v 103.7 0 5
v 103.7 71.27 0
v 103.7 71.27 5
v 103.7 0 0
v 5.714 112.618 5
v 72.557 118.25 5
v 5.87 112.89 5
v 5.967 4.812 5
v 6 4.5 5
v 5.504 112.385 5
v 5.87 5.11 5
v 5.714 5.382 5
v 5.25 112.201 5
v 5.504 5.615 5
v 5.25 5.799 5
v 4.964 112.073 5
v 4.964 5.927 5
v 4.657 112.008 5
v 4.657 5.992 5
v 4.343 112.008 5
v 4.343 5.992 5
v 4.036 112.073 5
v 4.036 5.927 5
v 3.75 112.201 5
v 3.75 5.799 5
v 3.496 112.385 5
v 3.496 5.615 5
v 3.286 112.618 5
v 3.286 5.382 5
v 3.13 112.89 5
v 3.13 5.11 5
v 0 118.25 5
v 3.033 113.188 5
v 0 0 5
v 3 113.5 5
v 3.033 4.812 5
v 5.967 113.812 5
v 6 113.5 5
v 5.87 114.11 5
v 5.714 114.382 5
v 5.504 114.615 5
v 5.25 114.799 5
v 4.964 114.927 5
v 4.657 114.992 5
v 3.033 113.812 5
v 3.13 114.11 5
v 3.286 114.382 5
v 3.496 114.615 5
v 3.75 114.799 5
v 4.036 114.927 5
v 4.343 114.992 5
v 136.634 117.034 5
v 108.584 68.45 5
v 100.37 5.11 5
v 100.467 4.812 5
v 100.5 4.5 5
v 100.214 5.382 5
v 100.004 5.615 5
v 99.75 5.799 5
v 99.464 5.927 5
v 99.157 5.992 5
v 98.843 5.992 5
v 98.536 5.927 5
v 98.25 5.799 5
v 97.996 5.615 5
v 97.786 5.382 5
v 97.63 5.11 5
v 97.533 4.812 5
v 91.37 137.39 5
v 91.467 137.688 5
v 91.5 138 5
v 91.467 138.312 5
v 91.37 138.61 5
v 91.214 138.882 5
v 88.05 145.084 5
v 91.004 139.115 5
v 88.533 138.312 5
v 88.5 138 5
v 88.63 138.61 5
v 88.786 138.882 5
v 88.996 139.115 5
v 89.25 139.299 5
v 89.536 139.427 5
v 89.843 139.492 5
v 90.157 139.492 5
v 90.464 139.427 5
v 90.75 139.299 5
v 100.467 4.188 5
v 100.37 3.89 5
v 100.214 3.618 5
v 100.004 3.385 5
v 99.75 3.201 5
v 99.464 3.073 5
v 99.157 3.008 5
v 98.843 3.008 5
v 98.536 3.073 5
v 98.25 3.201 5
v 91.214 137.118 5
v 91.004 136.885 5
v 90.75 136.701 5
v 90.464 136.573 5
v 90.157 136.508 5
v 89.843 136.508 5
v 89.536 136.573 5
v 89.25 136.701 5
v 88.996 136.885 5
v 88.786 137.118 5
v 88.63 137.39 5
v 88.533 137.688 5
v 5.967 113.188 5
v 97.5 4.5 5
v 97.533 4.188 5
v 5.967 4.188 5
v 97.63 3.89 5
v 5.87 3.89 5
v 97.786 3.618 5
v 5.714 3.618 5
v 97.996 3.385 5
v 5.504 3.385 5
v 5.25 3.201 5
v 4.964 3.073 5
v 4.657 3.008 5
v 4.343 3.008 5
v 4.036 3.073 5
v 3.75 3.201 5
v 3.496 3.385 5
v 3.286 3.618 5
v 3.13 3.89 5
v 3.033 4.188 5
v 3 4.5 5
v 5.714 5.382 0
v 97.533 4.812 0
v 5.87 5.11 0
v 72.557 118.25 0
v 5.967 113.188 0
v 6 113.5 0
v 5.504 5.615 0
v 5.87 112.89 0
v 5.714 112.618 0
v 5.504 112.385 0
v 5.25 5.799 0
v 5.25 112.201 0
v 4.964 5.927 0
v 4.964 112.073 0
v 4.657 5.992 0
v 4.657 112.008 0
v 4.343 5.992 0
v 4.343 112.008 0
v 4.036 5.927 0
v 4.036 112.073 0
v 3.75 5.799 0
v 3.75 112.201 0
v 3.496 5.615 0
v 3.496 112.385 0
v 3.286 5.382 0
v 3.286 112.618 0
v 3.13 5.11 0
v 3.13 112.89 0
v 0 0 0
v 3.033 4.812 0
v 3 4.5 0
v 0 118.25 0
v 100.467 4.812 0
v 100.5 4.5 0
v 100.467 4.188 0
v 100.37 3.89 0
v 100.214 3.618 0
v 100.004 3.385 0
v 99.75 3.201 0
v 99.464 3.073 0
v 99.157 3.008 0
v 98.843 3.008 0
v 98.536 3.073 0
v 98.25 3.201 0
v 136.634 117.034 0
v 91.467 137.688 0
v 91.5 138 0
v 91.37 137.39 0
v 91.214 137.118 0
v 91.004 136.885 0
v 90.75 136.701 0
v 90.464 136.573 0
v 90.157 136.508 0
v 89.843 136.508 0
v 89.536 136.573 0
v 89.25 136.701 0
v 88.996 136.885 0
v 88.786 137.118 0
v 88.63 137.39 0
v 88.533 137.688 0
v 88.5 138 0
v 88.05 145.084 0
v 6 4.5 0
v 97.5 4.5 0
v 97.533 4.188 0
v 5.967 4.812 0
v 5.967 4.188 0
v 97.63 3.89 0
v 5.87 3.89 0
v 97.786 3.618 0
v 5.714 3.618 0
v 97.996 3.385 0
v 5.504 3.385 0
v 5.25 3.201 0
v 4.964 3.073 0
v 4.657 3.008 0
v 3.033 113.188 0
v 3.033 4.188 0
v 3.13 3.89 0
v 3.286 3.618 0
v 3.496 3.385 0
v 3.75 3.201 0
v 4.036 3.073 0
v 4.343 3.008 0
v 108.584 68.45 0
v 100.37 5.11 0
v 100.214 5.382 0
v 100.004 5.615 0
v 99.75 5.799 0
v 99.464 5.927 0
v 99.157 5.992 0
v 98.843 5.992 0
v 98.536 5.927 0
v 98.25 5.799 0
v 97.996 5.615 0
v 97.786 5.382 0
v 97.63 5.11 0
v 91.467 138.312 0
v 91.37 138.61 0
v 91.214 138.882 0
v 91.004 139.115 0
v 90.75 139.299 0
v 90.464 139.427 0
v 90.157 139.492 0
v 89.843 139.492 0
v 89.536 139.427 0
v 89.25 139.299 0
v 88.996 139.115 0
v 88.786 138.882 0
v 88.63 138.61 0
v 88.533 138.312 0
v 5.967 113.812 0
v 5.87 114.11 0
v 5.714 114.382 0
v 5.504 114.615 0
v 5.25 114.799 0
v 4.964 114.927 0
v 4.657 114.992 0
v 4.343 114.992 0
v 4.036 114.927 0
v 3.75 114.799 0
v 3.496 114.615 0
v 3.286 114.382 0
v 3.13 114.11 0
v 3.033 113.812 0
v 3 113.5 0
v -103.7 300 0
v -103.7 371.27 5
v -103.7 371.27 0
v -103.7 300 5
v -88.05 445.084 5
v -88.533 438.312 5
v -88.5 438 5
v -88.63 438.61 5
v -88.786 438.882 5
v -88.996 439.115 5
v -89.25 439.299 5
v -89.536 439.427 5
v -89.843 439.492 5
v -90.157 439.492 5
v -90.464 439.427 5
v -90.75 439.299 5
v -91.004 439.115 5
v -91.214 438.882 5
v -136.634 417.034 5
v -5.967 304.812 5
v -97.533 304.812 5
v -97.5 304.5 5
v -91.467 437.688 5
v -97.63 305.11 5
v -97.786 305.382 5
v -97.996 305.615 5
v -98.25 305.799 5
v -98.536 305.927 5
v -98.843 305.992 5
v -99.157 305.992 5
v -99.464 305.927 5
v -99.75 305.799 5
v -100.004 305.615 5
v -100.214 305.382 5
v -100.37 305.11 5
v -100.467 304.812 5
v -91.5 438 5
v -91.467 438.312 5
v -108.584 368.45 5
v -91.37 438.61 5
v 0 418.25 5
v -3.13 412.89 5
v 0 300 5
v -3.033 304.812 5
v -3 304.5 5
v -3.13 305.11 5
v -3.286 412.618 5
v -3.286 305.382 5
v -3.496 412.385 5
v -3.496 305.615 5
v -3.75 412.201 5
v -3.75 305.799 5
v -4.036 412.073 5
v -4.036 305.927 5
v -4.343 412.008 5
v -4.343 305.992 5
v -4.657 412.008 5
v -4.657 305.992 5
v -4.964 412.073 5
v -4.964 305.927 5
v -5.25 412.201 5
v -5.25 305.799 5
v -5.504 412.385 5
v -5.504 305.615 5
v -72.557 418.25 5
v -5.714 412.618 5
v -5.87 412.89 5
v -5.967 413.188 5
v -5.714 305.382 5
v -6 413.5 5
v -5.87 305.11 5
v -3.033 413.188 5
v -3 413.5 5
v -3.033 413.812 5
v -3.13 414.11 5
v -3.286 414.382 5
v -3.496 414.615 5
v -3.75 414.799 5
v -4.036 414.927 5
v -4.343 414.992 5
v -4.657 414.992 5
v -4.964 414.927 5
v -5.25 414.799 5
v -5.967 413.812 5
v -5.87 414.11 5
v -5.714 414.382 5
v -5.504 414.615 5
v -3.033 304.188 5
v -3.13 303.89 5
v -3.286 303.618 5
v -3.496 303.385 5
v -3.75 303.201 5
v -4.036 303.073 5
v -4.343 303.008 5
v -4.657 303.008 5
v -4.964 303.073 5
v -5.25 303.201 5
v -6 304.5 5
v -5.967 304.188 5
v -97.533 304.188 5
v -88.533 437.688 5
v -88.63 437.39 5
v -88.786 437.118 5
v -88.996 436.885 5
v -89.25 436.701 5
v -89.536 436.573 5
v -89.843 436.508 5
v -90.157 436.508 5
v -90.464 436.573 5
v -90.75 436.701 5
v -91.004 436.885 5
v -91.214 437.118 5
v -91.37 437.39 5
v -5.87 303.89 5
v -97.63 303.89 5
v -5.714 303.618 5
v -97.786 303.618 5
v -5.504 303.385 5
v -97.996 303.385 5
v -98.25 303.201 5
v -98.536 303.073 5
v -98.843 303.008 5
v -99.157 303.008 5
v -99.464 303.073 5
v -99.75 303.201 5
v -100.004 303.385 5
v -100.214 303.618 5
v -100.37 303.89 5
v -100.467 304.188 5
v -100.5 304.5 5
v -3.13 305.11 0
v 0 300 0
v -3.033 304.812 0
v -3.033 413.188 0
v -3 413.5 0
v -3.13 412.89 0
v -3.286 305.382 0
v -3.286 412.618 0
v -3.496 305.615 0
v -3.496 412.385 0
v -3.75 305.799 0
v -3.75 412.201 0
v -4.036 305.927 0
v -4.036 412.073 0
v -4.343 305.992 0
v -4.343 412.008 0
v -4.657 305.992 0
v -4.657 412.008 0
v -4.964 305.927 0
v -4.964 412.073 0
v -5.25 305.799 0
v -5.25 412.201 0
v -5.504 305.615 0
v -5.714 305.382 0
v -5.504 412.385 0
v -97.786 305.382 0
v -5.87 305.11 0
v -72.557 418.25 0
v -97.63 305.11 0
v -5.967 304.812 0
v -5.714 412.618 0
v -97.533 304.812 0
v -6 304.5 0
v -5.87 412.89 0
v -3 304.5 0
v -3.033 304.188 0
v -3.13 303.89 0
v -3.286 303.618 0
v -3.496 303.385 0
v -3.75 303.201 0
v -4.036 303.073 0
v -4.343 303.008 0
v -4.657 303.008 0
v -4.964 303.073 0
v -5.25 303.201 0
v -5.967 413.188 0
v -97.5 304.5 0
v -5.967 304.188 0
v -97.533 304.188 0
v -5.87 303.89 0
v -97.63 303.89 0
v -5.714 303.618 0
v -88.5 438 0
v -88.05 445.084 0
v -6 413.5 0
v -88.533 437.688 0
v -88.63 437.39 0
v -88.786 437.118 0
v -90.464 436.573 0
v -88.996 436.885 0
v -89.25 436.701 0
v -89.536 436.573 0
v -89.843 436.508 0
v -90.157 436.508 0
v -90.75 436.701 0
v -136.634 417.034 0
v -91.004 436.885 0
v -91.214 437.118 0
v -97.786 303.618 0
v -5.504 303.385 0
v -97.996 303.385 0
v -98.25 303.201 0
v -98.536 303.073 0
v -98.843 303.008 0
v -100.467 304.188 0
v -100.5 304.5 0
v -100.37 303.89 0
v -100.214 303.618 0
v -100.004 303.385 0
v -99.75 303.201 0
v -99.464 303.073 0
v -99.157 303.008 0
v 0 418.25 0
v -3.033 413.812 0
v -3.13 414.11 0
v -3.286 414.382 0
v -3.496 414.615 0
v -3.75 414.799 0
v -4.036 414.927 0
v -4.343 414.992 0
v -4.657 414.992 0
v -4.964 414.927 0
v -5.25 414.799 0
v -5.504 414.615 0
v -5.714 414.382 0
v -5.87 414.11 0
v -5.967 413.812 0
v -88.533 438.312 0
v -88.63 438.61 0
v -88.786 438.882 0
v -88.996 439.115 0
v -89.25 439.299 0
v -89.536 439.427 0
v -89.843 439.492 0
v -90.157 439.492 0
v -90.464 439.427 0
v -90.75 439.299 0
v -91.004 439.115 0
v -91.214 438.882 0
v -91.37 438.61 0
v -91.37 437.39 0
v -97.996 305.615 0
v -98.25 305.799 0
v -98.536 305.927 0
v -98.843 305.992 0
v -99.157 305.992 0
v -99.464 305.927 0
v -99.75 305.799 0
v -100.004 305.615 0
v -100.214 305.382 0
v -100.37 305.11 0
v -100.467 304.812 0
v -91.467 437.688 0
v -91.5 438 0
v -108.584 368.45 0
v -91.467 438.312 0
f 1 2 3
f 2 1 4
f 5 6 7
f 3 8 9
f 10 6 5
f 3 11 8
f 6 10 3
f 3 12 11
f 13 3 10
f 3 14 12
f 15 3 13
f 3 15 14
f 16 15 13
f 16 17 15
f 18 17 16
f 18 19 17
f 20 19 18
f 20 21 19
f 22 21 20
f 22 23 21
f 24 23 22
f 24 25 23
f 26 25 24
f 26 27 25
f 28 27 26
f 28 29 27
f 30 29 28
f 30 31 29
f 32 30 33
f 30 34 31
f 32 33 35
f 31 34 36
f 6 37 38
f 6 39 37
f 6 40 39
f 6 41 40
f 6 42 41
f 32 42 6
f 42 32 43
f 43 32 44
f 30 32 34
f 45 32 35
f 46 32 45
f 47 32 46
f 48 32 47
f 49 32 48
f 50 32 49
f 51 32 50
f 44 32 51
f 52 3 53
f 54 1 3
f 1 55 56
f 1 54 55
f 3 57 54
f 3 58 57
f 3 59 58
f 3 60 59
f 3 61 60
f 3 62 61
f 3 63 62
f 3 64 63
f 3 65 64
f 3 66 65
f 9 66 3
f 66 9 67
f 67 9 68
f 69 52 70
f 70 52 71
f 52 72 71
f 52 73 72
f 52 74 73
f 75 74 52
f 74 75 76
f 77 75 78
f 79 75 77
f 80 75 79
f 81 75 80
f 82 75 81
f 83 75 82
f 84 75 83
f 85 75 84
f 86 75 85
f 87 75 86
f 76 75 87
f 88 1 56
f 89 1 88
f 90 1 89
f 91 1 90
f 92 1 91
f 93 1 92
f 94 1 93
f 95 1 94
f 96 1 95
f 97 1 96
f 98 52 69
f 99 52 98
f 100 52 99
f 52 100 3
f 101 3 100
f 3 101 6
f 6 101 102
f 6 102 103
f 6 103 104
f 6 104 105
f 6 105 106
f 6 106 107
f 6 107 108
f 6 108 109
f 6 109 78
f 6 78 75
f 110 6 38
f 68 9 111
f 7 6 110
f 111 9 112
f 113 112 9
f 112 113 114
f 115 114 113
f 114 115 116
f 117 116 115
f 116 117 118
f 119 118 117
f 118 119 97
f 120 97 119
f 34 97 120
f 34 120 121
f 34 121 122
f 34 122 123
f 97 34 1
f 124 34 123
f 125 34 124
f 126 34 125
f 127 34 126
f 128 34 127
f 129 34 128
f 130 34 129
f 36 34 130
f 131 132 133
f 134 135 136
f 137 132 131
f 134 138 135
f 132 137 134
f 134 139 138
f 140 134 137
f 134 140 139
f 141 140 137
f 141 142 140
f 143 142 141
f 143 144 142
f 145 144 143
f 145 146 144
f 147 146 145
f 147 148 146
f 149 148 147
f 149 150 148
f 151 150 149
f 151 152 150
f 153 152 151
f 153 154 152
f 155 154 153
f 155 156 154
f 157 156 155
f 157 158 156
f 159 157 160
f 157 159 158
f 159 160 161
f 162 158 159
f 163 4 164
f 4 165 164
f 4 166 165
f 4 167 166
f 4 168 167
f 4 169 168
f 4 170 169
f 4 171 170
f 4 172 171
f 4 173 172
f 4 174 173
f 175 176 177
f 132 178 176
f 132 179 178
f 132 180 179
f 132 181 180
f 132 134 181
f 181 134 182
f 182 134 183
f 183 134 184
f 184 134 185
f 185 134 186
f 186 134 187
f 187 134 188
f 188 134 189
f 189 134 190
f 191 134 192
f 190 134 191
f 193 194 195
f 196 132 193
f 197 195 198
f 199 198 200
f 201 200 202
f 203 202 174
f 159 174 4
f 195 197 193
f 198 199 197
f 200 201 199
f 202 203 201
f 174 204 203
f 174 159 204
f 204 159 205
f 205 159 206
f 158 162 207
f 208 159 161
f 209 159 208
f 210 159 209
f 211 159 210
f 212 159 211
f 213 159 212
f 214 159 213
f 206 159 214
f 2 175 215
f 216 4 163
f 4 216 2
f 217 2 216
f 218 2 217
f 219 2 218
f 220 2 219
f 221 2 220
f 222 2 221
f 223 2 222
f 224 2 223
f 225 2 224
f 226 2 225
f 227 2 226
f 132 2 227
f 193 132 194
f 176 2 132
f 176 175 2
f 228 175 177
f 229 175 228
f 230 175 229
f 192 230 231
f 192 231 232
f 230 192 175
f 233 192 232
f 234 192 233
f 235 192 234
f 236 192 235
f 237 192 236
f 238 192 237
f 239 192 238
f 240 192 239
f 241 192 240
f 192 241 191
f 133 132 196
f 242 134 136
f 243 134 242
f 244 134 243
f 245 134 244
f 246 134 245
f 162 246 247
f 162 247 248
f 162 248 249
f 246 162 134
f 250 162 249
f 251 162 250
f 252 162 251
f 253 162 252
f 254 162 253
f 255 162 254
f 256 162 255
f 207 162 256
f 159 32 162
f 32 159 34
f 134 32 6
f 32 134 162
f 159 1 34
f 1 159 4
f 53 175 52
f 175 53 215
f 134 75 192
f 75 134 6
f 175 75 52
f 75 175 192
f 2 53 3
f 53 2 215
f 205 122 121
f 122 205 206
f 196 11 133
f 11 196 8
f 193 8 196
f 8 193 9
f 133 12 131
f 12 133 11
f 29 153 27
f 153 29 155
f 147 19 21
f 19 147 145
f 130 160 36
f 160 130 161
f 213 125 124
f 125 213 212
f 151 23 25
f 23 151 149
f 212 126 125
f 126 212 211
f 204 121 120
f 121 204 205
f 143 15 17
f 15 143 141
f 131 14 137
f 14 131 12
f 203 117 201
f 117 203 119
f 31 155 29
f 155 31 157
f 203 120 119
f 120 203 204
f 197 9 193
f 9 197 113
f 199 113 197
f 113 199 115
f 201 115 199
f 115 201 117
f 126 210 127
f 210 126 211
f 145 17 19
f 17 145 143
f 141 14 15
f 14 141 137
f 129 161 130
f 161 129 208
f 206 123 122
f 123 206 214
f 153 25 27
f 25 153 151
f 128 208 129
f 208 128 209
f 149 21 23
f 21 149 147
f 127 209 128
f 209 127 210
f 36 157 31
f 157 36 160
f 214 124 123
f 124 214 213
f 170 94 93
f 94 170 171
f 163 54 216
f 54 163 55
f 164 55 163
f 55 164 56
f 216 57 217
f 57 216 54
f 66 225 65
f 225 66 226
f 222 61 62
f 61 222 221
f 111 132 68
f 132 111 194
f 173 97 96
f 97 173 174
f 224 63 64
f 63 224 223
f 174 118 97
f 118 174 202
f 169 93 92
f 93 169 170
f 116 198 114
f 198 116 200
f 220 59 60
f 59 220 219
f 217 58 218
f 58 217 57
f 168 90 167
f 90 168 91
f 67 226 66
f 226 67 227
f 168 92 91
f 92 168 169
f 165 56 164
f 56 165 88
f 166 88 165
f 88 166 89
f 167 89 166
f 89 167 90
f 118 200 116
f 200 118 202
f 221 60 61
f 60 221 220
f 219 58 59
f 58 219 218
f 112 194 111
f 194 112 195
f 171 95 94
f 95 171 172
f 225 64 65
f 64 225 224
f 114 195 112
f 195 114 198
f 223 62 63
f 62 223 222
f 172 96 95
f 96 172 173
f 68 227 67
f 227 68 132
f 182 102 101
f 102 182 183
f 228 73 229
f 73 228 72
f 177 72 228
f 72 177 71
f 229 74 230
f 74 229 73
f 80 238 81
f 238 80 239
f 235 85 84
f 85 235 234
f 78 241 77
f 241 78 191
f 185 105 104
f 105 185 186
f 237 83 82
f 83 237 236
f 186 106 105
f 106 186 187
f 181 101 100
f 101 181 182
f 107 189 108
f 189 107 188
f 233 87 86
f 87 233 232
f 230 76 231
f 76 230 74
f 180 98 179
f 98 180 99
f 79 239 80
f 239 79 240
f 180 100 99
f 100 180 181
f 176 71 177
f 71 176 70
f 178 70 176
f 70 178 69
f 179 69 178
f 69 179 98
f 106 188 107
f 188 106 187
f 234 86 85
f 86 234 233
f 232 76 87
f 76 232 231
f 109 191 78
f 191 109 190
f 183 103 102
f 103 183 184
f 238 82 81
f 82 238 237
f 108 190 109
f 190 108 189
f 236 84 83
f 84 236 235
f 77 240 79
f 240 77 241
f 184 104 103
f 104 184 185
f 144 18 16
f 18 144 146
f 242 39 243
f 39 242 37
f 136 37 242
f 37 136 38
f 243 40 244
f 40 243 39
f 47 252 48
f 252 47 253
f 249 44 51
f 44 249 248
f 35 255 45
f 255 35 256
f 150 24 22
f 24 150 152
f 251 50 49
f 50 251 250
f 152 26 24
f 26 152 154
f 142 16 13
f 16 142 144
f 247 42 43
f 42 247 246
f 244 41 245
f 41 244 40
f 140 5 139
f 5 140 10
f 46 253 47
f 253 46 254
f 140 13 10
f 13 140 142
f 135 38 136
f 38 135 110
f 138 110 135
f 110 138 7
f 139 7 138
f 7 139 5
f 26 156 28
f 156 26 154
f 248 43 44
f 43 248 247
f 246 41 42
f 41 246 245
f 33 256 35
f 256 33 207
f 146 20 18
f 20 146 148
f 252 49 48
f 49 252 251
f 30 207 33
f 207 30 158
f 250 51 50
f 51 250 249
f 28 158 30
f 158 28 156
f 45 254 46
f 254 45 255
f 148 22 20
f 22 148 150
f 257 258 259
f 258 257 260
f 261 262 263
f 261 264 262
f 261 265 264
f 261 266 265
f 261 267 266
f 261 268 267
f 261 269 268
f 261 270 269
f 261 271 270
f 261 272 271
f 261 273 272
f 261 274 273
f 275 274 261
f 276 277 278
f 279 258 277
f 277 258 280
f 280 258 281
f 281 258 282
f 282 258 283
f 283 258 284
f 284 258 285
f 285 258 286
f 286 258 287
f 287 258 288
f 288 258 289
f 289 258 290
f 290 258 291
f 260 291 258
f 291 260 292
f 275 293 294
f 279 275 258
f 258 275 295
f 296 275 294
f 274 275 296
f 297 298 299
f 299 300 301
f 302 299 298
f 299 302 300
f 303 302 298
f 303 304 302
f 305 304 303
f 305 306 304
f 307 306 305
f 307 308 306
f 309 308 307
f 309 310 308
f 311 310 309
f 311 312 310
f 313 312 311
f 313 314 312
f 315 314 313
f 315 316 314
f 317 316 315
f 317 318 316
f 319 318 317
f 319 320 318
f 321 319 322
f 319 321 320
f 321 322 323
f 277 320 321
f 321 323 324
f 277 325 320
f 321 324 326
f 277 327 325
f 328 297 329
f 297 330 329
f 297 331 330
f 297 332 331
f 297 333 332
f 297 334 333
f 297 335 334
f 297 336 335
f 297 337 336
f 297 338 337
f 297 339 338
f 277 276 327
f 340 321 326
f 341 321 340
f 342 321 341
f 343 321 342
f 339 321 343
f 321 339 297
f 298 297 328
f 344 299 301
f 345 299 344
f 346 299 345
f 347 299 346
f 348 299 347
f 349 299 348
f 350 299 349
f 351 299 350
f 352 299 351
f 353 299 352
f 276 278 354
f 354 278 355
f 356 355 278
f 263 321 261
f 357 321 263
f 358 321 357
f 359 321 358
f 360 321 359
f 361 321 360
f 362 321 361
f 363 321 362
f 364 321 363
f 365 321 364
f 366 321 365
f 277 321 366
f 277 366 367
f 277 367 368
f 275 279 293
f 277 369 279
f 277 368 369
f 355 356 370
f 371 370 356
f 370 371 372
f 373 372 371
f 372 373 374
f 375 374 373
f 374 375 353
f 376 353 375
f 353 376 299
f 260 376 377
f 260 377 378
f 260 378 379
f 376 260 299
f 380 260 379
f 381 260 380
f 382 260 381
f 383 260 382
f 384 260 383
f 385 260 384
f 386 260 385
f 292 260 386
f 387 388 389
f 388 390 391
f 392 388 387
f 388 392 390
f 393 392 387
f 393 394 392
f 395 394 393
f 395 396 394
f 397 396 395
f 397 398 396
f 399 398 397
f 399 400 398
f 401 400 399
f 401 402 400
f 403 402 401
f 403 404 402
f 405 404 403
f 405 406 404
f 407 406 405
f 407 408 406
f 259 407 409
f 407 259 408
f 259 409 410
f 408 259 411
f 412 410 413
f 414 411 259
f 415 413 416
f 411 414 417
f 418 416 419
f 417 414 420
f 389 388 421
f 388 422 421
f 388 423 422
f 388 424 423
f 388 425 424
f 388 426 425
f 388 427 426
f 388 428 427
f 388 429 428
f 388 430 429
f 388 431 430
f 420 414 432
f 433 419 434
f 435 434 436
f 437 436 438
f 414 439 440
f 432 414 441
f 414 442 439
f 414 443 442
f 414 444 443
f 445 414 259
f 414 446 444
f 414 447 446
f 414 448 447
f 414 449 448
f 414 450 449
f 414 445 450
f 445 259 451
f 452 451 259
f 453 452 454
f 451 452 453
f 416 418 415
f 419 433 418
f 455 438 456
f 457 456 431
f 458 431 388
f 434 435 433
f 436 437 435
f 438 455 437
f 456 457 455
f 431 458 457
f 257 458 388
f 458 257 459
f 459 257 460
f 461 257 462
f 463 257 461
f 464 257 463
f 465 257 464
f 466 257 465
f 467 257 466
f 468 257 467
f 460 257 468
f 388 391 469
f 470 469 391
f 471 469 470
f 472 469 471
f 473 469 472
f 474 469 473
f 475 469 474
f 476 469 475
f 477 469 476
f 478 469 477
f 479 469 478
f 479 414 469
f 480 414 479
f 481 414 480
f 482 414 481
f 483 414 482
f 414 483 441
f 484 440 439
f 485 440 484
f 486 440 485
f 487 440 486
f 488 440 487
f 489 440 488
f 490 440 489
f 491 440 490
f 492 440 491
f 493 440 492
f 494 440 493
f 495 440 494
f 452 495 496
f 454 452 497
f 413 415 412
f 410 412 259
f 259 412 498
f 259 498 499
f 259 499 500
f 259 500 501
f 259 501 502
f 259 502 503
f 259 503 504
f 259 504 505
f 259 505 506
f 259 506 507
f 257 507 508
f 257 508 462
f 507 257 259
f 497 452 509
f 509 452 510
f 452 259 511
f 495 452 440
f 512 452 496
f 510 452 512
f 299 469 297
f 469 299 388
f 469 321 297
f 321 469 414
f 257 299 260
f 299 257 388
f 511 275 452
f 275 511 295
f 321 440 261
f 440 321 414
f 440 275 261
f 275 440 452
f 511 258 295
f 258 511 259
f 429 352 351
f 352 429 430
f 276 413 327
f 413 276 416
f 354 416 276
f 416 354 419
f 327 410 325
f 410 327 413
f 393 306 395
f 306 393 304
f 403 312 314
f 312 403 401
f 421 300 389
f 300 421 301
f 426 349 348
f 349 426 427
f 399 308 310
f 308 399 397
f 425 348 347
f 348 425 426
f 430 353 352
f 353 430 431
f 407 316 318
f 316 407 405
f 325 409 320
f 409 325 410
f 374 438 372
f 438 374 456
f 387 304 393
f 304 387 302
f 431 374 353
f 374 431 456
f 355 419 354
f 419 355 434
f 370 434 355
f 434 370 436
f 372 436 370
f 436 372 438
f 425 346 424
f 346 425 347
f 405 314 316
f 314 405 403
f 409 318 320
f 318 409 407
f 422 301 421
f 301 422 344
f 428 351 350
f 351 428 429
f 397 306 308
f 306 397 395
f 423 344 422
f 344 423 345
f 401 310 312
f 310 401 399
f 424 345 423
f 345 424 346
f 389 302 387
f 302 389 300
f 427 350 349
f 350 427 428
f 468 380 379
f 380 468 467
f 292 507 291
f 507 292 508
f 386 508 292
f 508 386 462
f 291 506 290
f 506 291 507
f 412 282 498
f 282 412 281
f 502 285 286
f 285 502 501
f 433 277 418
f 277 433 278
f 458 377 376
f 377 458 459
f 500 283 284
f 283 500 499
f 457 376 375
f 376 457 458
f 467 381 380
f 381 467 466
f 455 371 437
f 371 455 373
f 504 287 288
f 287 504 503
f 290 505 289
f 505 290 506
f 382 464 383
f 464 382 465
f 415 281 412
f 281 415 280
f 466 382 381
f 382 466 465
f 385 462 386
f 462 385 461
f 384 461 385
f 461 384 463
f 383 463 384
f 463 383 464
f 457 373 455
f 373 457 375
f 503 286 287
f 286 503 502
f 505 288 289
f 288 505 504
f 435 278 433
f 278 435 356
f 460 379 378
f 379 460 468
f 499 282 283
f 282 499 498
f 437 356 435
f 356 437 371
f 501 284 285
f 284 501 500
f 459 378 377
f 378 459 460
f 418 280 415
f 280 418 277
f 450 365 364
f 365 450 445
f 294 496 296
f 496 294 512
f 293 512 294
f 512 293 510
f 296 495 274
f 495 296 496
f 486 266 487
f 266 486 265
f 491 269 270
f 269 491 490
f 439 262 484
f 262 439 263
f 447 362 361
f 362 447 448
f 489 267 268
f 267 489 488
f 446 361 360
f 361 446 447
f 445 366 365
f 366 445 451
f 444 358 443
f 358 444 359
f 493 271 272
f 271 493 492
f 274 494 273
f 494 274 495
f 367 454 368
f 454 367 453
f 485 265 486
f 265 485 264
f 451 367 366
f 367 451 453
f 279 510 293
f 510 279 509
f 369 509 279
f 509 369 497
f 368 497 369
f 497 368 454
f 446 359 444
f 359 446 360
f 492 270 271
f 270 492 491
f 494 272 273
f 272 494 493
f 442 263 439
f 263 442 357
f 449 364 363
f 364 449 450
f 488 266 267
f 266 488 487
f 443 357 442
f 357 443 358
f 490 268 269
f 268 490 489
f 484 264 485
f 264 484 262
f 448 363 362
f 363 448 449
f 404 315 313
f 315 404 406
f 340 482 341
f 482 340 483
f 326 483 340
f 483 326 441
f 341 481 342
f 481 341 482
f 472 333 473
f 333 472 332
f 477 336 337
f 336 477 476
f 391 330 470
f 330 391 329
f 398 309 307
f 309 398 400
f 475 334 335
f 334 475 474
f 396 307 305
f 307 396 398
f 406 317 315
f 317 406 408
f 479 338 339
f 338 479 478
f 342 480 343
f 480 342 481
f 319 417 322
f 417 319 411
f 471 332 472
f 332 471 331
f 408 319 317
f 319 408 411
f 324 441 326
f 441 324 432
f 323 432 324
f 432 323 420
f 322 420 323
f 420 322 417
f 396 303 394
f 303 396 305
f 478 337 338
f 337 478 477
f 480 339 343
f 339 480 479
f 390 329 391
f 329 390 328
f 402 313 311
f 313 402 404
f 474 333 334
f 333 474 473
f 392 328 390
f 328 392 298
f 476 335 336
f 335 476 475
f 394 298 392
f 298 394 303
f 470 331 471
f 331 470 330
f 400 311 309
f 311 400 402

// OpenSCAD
union() {
	difference() {
		union() {
			cube(size = [0, 0, 0]);
			color(alpha = 1.0, c = "red") {
				translate(v = [0.0, 0.0, 0]) {
					rotate(a = [0, 0, -0.0]) {
						cube(size = [103.7, 118.25, 5]);
					}
				}
			}
			color(alpha = 1.0, c = "red") {
				translate(v = [60.0, 96.5, 0]) {
					rotate(a = [0, 0, -30.0]) {
						cube(size = [56.1, 56.1, 5]);
					}
				}
			}
		}
		union() {
			cube(size = [0, 0, 0]);
			cube(size = [0, 0, 0]);
			translate(v = [4.5, 4.5, -1]) {
				cylinder($fn = 30, h = 15, r = 1.5);
			}
			translate(v = [99, 4.5, -1]) {
				cylinder($fn = 30, h = 15, r = 1.5);
			}
			translate(v = [90, 138, -1]) {
				cylinder($fn = 30, h = 15, r = 1.5);
			}
			translate(v = [4.5, 113.5, -1]) {
				cylinder($fn = 30, h = 15, r = 1.5);
			}
		}
	}
	translate(v = [0, 300, 0]) {
		mirror(v = [1, 0, 0]) {
			difference() {
				union() {
					cube(size = [0, 0, 0]);
					color(alpha = 1.0, c = "red") {
						translate(v = [0.0, 0.0, 0]) {
							rotate(a = [0, 0, -0.0]) {
								cube(size = [103.7, 118.25, 5]);
							}
						}
					}
					color(alpha = 1.0, c = "red") {
						translate(v = [60.0, 96.5, 0]) {
							rotate(a = [0, 0, -30.0]) {
								cube(size = [56.1, 56.1, 5]);
							}
						}
					}
				}
				union() {
					cube(size = [0, 0, 0]);
					cube(size = [0, 0, 0]);
					translate(v = [4.5, 4.5, -1]) {
						cylinder($fn = 30, h = 15, r = 1.5);
					}
					translate(v = [99, 4.5, -1]) {
						cylinder($fn = 30, h = 15, r = 1.5);
					}
					translate(v = [90, 138, -1]) {
						cylinder($fn = 30, h = 15, r = 1.5);
					}
					translate(v = [4.5, 113.5, -1]) {
						cylinder($fn = 30, h = 15, r = 1.5);
					}
				}
			}
		}
	}
}
